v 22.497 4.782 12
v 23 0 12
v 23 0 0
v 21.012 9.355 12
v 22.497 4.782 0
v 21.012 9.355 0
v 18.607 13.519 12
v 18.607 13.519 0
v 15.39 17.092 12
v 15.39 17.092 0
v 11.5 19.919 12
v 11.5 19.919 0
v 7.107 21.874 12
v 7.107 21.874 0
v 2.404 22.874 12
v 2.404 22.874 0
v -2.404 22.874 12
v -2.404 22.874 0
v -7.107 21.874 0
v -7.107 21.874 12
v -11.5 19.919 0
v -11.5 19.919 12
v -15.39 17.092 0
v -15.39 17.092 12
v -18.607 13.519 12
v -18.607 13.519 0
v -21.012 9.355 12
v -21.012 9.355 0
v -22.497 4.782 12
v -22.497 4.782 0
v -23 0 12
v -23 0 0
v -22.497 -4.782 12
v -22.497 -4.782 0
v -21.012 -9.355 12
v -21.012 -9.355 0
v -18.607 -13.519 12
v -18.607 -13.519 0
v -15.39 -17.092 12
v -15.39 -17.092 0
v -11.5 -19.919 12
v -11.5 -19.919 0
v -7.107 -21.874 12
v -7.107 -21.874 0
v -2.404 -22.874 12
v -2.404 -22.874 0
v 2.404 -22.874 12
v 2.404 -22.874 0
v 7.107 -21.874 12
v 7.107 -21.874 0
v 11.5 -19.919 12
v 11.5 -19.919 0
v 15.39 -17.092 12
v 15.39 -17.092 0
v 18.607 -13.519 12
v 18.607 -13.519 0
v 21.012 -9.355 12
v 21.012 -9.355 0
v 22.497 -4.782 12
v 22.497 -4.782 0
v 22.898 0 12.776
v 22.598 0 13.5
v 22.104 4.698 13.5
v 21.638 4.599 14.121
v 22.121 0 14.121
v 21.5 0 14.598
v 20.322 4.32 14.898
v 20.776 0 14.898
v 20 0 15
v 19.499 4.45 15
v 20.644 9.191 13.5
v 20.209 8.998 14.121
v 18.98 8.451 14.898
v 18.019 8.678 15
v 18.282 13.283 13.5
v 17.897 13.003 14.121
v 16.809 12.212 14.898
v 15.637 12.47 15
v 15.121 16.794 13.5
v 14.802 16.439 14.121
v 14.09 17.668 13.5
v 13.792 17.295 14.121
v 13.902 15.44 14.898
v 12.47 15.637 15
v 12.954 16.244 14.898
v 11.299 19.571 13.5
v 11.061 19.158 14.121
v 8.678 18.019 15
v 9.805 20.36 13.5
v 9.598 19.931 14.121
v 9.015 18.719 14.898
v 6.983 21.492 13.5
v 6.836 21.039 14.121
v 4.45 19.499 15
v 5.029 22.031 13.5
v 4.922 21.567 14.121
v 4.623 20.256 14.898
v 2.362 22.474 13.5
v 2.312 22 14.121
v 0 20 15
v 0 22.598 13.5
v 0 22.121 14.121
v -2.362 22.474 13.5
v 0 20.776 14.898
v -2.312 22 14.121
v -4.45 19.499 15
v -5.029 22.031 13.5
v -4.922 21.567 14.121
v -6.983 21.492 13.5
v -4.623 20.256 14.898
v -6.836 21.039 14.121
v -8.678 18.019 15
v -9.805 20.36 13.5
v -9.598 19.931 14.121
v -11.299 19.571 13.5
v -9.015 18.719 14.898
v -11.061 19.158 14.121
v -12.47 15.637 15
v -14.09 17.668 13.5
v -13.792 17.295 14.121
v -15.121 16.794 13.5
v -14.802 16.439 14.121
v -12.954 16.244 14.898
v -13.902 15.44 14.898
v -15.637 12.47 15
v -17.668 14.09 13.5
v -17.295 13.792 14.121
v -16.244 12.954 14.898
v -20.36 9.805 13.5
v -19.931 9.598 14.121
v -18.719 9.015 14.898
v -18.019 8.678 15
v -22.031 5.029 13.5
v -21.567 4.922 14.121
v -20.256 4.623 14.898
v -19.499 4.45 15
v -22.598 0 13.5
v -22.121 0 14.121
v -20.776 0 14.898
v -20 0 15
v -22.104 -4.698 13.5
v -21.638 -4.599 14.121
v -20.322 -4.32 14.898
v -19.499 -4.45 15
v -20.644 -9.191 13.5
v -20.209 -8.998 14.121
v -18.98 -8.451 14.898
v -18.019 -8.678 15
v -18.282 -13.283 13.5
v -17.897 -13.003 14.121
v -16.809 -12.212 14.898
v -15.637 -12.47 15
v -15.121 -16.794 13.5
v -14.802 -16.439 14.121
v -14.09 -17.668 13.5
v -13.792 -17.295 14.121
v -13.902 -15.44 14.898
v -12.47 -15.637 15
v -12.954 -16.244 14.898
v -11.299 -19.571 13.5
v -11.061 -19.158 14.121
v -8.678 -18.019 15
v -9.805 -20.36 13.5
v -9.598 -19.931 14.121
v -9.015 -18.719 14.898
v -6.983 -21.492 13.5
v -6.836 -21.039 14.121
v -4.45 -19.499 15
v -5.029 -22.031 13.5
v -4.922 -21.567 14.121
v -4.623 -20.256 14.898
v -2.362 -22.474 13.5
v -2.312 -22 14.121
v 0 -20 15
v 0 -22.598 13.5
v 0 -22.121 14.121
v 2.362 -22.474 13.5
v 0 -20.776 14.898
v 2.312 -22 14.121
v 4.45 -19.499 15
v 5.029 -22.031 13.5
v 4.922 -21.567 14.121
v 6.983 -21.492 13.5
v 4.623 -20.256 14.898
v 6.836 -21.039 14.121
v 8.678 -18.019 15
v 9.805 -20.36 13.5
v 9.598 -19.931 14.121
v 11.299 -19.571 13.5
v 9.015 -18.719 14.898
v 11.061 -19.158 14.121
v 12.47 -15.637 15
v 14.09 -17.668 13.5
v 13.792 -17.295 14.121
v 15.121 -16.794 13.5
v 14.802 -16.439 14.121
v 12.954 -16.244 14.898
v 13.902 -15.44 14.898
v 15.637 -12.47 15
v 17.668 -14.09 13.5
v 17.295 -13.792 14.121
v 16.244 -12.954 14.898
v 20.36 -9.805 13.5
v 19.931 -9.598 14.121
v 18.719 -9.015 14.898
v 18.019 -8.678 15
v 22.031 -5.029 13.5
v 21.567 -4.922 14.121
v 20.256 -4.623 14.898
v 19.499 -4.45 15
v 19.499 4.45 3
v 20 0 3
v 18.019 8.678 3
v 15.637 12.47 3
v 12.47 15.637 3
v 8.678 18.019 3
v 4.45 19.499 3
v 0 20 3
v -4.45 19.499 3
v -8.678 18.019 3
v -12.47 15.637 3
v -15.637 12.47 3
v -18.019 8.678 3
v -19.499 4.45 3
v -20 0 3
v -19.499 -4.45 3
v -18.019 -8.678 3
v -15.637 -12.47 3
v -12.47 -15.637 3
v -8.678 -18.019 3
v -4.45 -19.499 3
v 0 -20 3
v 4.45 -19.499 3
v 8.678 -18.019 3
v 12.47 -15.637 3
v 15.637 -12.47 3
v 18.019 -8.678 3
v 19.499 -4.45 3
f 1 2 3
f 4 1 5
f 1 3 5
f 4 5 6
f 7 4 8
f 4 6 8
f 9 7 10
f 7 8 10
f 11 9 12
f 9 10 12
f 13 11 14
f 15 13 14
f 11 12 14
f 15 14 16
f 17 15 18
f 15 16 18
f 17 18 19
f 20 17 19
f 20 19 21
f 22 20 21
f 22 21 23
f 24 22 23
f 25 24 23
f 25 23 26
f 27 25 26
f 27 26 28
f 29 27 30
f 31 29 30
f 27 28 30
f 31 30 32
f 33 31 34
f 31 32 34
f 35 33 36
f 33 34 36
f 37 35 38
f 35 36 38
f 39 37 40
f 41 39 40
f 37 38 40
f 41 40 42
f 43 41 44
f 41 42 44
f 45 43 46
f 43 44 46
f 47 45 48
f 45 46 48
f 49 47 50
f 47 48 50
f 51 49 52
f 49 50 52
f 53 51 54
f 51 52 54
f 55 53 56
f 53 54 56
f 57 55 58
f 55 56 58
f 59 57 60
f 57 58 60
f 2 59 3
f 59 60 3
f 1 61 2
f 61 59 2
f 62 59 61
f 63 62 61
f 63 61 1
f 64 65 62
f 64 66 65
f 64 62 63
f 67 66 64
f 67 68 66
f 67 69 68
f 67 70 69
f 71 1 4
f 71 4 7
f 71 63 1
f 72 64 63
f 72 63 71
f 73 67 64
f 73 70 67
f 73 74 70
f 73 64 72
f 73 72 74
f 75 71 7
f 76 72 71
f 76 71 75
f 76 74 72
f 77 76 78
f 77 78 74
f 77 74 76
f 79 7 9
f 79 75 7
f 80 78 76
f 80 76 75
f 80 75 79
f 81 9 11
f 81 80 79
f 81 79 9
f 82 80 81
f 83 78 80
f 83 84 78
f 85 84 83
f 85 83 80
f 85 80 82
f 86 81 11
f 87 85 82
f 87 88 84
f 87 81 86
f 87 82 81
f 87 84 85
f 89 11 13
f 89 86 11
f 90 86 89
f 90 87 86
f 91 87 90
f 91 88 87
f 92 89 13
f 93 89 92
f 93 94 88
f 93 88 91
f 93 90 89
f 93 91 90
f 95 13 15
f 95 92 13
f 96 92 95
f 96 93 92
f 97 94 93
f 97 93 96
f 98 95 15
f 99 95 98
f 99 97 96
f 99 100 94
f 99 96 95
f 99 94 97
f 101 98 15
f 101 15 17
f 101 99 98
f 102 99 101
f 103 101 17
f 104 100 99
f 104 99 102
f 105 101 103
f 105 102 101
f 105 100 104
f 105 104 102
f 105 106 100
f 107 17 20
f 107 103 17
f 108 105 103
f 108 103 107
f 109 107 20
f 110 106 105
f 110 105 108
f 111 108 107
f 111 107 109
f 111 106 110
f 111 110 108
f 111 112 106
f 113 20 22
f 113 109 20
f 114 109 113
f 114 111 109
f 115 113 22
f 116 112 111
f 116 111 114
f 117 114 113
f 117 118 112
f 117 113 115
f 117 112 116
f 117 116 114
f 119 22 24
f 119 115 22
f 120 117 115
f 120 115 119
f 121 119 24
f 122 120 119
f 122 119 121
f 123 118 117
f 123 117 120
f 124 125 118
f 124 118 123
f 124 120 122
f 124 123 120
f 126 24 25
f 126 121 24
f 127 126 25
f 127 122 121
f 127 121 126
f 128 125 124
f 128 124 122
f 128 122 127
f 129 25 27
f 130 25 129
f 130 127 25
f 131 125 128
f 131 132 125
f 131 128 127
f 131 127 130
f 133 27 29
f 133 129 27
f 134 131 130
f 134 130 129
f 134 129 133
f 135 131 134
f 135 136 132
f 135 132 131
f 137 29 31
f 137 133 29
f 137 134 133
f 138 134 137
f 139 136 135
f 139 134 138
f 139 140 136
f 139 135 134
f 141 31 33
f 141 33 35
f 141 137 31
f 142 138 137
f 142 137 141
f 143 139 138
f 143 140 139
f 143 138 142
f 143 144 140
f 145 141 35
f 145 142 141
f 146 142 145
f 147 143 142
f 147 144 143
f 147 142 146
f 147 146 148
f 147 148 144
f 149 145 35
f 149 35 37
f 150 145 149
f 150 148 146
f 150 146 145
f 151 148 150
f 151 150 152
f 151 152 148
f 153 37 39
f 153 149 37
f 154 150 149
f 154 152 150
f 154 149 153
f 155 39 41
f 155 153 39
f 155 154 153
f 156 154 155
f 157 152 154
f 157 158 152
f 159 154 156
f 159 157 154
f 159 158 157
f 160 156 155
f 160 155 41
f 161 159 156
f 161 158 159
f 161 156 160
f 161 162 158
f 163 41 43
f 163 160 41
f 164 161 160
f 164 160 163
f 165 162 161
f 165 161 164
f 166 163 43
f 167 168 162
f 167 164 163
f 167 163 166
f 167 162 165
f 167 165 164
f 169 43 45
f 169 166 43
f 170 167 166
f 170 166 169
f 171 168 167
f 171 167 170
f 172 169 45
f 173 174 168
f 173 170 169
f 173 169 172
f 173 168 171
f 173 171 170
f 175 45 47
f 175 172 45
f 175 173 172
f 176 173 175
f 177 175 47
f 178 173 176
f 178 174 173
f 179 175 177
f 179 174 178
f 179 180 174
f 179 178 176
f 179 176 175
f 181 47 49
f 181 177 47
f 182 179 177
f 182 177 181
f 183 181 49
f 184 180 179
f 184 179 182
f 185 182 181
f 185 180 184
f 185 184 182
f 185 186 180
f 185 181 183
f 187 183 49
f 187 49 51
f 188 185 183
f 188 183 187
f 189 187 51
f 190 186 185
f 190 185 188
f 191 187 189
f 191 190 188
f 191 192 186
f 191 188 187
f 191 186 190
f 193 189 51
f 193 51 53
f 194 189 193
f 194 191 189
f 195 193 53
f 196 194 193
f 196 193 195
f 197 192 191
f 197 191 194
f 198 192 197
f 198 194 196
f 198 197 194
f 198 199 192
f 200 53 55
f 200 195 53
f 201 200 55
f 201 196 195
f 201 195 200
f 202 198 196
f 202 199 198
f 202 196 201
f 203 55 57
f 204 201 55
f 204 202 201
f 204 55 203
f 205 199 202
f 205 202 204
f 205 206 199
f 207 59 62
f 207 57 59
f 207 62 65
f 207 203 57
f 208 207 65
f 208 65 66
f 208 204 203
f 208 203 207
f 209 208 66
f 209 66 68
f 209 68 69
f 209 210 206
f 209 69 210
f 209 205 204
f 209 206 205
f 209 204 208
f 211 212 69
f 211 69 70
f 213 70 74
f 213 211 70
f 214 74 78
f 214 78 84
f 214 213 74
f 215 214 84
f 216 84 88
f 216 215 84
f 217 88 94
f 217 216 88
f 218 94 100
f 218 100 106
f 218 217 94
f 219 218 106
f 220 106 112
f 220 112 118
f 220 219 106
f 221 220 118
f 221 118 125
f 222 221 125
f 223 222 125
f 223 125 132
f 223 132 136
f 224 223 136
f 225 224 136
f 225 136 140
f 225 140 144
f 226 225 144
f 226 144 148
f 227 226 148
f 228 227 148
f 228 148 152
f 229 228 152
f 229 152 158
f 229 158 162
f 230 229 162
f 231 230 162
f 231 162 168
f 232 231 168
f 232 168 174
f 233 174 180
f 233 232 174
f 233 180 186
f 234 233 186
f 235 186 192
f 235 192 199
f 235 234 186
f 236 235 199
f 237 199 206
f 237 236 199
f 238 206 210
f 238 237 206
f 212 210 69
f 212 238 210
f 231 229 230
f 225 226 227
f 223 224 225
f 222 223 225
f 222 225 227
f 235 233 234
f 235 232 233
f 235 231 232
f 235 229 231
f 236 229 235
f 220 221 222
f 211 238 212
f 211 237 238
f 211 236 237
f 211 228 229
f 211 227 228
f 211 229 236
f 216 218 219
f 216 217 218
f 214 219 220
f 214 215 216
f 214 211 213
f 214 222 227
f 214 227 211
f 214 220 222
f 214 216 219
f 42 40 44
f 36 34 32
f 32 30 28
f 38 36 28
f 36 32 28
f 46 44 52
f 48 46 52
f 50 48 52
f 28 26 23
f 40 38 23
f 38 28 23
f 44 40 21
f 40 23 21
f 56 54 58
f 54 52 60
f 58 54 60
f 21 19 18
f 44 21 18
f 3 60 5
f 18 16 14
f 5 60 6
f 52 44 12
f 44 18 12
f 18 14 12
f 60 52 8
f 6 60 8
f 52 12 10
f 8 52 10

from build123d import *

# Parameters (mm, degrees)
F0_R     = 23
F0_R_2   = 20
F1_DEPTH = 15
F2_R     = 23
F3_DEPTH = 3
F4_R     = 2.99999


# Not quite as in the source:
# - a fillet or chamfer is up to 0.001 mm smaller than in the source, because OpenCascade refuses the exact size


with BuildPart() as f1:
    # F0 (on Top) → F1 (new body)
    with BuildSketch(Plane.XY):
        Circle(F0_R)
        Circle(F0_R_2, mode=Mode.SUBTRACT)
    extrude(amount=F1_DEPTH)

    # F2 (on Top) → F3 (join)
    with BuildSketch(Plane.XY):
        Circle(F2_R)
    extrude(amount=F3_DEPTH)

    # F4 (radius 3 in the source; OpenCascade refuses exactly that, so slightly less here)
    f4_edges = [f1.edges().sort_by_distance(p)[0] for p in [
        (-23, 0, 15),
    ]]
    fillet(f4_edges, radius=F4_R)


solid = f1.part
